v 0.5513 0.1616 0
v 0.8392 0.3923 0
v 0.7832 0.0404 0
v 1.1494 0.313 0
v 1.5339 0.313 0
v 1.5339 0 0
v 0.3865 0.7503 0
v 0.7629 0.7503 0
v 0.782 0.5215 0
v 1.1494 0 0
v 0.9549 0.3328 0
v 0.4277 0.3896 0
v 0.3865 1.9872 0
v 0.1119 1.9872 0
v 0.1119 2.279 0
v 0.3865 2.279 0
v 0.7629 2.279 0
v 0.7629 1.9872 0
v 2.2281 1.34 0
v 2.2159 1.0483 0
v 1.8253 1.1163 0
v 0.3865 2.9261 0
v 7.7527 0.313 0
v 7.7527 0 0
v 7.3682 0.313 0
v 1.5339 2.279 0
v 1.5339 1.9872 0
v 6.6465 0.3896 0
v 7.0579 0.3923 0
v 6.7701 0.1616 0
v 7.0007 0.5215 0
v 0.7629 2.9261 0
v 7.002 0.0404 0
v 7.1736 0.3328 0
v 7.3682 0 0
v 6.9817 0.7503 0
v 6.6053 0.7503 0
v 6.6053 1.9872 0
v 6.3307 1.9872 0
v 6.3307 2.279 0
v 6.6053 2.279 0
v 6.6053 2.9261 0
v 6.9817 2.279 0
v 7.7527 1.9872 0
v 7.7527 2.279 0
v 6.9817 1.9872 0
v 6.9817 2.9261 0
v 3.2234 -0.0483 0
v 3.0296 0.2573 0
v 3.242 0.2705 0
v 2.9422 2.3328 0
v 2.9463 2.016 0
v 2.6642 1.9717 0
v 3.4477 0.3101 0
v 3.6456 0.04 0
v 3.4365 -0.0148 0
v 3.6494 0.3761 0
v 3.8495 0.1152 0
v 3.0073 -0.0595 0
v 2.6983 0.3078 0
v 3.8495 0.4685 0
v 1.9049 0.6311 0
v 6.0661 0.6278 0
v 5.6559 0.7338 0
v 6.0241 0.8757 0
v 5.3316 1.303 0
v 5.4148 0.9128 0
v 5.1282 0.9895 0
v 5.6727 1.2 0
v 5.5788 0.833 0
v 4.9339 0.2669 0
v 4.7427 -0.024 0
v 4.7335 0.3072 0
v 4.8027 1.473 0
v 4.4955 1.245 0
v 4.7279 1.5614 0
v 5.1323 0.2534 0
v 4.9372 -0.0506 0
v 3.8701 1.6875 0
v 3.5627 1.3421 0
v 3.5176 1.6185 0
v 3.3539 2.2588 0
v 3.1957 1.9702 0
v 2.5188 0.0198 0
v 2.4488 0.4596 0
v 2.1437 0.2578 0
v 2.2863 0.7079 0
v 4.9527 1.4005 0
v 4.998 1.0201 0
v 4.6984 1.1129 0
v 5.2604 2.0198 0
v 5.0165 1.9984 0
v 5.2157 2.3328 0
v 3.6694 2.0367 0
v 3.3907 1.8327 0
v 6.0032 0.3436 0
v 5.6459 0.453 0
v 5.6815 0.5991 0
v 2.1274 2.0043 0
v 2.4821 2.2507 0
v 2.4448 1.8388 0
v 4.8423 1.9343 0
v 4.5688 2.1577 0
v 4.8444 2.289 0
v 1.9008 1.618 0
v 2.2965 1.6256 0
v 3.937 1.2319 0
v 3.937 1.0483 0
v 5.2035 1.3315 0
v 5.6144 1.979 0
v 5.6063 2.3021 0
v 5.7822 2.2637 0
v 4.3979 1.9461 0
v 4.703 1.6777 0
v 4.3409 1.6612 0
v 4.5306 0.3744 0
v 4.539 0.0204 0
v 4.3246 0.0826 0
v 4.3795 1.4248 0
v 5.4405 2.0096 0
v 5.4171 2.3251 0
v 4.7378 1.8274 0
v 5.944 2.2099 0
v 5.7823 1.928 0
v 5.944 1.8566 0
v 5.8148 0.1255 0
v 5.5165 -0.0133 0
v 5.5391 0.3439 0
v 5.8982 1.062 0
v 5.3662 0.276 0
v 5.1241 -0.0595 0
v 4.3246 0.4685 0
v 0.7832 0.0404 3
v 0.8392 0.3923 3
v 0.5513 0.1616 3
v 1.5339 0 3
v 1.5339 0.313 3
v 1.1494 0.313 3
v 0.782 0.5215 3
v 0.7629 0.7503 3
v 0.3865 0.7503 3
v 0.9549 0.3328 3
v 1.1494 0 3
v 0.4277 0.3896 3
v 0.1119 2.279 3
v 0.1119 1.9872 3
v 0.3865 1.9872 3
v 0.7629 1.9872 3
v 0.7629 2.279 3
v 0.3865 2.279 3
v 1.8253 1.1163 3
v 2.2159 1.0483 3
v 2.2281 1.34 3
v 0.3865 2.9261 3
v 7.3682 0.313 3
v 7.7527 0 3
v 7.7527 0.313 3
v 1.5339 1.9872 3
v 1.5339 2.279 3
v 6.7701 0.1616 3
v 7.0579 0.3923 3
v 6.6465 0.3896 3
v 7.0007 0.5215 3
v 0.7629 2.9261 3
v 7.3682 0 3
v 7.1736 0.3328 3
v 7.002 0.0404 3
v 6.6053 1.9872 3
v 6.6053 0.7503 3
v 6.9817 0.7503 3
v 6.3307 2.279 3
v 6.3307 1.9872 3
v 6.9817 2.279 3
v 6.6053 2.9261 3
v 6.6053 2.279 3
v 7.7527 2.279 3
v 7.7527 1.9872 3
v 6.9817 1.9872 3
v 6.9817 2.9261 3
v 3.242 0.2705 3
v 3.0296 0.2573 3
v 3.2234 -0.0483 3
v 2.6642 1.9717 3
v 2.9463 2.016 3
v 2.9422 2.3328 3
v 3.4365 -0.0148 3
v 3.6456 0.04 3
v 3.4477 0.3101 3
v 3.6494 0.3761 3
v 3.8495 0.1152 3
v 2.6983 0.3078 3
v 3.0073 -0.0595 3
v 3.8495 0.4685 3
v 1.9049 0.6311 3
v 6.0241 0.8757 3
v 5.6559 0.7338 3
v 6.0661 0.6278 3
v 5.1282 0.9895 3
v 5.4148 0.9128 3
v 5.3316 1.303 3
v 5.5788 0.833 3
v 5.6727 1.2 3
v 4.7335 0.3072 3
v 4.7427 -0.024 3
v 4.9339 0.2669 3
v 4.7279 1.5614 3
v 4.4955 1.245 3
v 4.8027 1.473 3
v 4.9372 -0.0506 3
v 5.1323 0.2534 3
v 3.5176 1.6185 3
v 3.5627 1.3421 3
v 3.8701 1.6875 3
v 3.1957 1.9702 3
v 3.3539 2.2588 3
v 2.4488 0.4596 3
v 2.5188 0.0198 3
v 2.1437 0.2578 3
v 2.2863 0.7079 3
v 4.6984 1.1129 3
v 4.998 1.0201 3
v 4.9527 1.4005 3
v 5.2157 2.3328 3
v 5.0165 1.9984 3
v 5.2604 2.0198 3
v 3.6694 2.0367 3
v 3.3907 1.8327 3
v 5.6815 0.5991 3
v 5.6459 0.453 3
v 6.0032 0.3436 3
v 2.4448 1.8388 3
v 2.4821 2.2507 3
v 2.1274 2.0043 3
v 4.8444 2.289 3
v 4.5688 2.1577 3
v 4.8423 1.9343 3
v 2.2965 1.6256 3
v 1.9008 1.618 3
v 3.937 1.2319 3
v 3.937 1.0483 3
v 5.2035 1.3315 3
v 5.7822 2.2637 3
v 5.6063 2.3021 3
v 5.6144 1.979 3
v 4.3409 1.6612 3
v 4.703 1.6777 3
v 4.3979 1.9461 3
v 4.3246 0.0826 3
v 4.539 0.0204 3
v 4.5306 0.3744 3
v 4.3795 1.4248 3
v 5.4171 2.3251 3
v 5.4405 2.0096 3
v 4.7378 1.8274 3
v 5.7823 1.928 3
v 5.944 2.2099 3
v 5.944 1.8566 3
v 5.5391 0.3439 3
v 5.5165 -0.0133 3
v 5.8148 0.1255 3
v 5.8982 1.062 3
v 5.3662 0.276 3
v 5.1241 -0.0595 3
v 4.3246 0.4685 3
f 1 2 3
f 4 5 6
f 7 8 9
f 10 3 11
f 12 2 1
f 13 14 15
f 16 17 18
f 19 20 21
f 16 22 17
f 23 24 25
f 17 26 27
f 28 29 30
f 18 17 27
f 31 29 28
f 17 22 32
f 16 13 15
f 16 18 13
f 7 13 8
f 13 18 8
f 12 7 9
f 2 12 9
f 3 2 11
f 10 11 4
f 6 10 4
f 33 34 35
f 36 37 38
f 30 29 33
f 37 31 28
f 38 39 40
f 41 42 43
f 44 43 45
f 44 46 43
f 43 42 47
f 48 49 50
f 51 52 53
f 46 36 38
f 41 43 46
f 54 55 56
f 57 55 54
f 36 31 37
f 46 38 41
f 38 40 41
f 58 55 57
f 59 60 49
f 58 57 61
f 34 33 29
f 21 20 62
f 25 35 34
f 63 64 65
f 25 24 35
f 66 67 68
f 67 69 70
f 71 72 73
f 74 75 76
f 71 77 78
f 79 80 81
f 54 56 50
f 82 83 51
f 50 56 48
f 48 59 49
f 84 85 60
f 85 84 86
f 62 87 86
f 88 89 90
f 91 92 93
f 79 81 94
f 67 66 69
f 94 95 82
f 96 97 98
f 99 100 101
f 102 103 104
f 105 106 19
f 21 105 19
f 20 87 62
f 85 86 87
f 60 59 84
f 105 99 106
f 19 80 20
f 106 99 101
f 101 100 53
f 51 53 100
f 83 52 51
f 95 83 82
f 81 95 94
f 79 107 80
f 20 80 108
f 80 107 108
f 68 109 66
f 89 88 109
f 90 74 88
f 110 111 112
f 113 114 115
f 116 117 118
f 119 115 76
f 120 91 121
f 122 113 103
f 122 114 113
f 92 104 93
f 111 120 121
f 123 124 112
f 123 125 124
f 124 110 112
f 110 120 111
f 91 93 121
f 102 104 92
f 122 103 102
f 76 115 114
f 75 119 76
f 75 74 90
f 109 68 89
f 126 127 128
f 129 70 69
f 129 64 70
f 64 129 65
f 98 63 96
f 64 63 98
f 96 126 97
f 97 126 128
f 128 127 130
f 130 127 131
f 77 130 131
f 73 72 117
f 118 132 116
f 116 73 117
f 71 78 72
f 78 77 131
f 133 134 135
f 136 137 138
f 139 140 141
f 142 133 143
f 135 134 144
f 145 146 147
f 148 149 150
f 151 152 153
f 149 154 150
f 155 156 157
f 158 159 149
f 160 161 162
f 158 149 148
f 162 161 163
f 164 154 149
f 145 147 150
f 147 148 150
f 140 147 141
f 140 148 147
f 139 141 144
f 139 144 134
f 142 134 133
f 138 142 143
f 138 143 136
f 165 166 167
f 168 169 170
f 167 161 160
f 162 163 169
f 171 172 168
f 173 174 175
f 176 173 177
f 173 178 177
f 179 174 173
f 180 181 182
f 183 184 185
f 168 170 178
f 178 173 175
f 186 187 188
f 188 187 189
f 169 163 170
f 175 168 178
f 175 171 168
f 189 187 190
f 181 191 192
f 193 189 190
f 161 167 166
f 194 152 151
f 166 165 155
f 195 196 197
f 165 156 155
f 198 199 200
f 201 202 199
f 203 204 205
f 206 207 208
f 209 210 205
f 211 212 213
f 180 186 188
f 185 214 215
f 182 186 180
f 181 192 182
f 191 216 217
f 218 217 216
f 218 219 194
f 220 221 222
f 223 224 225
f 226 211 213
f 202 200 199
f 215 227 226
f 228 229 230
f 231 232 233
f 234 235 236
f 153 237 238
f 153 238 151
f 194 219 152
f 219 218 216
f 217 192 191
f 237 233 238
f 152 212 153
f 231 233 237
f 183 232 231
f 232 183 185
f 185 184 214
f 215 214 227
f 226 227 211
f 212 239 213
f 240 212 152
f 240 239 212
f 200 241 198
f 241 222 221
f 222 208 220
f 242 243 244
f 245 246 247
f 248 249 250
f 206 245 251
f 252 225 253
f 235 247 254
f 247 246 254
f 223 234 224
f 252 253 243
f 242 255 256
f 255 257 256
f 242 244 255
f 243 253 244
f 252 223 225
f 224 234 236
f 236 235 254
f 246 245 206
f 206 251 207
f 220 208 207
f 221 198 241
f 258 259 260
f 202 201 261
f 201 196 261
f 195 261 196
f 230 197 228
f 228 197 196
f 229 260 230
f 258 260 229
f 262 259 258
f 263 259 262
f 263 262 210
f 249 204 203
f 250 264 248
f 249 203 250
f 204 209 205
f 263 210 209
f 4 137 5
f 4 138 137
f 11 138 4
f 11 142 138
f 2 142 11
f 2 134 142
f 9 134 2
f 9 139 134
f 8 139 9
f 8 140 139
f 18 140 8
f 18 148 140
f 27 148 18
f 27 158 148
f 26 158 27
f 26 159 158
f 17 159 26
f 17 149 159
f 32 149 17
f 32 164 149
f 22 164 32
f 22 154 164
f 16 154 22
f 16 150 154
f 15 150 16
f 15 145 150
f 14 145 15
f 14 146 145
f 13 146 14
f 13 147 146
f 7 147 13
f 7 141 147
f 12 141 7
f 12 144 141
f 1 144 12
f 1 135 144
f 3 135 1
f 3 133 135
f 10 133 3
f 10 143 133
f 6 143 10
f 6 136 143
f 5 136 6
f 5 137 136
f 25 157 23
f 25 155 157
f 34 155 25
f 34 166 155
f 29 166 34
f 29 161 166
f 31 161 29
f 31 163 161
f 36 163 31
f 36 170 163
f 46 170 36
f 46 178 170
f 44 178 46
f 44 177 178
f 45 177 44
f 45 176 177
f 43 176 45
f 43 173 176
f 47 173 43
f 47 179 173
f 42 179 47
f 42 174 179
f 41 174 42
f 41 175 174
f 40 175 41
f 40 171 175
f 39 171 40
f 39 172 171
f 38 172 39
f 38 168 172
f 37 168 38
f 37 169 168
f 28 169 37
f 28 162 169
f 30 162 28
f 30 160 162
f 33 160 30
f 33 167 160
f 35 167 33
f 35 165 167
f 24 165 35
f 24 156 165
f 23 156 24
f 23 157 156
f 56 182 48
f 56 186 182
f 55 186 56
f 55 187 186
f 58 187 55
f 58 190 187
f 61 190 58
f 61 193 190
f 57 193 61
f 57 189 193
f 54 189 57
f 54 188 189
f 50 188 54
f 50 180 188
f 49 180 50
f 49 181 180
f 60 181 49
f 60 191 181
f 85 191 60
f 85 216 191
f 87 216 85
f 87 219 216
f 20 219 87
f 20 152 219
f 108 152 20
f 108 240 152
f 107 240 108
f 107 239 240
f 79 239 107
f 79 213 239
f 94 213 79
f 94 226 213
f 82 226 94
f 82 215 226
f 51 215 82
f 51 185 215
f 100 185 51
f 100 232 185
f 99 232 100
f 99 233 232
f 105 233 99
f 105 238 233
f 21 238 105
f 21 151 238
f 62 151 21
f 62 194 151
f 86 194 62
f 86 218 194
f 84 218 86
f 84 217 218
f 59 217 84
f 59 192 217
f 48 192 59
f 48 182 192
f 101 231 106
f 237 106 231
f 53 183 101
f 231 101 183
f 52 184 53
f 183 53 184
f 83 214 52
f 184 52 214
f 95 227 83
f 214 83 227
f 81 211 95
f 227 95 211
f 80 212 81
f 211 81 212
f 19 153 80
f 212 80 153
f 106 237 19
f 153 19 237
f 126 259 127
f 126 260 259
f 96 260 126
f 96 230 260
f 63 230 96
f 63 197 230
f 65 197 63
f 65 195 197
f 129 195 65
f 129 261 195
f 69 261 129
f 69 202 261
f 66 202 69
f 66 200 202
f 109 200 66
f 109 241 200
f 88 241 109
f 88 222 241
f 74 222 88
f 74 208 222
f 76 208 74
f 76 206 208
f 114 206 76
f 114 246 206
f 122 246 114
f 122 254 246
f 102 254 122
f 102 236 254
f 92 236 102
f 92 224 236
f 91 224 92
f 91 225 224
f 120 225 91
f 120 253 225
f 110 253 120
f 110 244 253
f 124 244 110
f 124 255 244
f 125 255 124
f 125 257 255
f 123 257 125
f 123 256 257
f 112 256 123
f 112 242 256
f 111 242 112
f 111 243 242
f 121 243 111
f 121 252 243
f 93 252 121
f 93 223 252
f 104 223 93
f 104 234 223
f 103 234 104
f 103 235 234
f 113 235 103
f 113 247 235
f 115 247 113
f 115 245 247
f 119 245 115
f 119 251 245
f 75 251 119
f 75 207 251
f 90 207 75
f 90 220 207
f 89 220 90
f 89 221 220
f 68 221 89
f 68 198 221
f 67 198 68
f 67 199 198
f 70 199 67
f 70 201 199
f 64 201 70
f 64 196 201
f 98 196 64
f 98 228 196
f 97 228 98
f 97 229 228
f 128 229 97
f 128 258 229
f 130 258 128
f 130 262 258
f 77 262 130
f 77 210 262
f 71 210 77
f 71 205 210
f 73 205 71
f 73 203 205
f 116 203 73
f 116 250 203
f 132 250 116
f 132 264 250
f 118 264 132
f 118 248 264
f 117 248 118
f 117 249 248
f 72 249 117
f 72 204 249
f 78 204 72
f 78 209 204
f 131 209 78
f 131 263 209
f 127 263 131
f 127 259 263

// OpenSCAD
texte_a_inserer = "test"; 
taille = 3; 
police = "Acme"; //[[Abril Fatface,Aclonica,Acme,Advent Pro,Akronim,Aladin,Alegreya,Alegreya Sans,Alegreya SC,Alex Brush,Alfa Slab One,Alice,Amaranth,Architects Daughter,Archivo Black,Archivo Narrow,Arimo,Arvo,Asap,Astloch,Asul,Averia Libre,Averia Serif Libre,Bangers,Basic,Belgrano,Berkshire Swash,Bigshot One,Bilbo Swash Caps,Black Ops One,Bonbon,Bowlby One SC,Brawler,Bubblegum Sans,Butterfly Kids,Cabin Condensed,Caesar Dressing,Cagliostro,Calligraffitti,Capriola,Carter One,Changa One,Chango,Chelsea Market,Cherry Cream Soda,Chewy,Chicle,Chivo,Clicker Script,Coming Soon,Concert One,Condiment,Cookie,Courgette,Covered By Your Grace,Crimson Text,Dancing Script,DejaVu Sans,DejaVu Serif,Dhurjati,Doppio One,Dosis,Droid Sans,Eagle Lake,Electrolize,Emilys Candy,Encode Sans,Encode Sans Compressed,Euphoria Script,Exo,Exo 2,Faster One,Federo,Finger Paint,Fjord One,Fontdiner Swanky,Freckle Face,Fruktur,Gabriela,Geo,Germania One,Give You Glory,Gloria Hallelujah,Goudy Bookletter 1911,Graduate,Grand Hotel,Great Vibes,Griffy,Hanalei Fill,Happy Monkey,Henny Penny,Hind,IM Fell English SC,Indie Flower,Irish Grover,Italianno,Jacques Francois Shadow,Jolly Lodger,Josefin Slab,Joti One,Judson,Just Another Hand,Kalam,Kameron,Karma,Kavoon,Knewave,Kranky,Kristi,Laila,Lakki Reddy,Lancelot,Lato,Leckerli One,Ledger,Lekton,Lemon One,Liberation Sans,Libre Caslon Text,Life Savers,Lilita One,Lily Script One,Limelight,Lobster,Lobster Two,Londrina Outline,Londrina Shadow,Londrina Solid,Lora,Love Ya Like A Sister,Loved by the King,Lovers Quarrel,Luckiest Guy,Lusitana,Macondo,Macondo Swash Caps,Mako,Marck Script,Margarine,Marko One,Maven Pro,McLaren,MedievalSharp,Merienda One,Merriweather,Mervale Script,Metal Mania,Metrophobic,Milonga,Miltonian Tattoo,Miss Fajardose,Molle,Montez,Montserrat,Mr De Haviland,Mystery Quest,Neucha,New Rocker,Niconne,Nosifer,Nothing You Could Do,Noto Sans Oriya,Noto Serif,Nova Square,Nunito,Old Standard TT,Oleo Script,Oleo Script Swash Caps,Orbitron,Oregano,Orienta,Original Surfer,Oswald,Over the Rainbow,Overlock,Oxygen,Pacifico,Paprika,Parisienne,Patrick Hand SC,Paytone One,Peralta,Permanent Marker,Piedra,Pirata One,Play,Playball,Poetsen One,Poppins,Press Start 2P,Princess Sofia,PT Mono,Qwigley,Racing Sans One,Raleway,Rancho,Ranga,Ribeye,Roboto,Roboto Condensed,Roboto Slab,Rochester,Rock Salt,Rubik One,Sail,Salsa,Sansita One,Sarina,Satisfy,Schoolbell,Seaweed Script,Sevillana,Shadows Into Light,Shadows Into Light Two,Share,Six Caps,Skranji,Source Sans Pro,Spicy Rice,Stardos Stencil,Stoke,Syncopate,Teko,Terminal Dosis,The Girl Next Door,Tillana,Timmana,Titillium Web,Ubuntu,Ultra,Underdog,UnifrakturCook,UnifrakturMaguntia,Vampiro One,Vidaloka,Viga,Voces,Volkhov,Vollkorn,Voltaire,Waiting for the Sunrise,Wallpoet,Wellfleet,Wendy One,Yellowtail,Yesteryear,Zeyada]]
hauteur = 3; 
module rendu(){
linear_extrude(hauteur) text(texte_a_inserer,size = taille, font = police);
}
rendu();
 
